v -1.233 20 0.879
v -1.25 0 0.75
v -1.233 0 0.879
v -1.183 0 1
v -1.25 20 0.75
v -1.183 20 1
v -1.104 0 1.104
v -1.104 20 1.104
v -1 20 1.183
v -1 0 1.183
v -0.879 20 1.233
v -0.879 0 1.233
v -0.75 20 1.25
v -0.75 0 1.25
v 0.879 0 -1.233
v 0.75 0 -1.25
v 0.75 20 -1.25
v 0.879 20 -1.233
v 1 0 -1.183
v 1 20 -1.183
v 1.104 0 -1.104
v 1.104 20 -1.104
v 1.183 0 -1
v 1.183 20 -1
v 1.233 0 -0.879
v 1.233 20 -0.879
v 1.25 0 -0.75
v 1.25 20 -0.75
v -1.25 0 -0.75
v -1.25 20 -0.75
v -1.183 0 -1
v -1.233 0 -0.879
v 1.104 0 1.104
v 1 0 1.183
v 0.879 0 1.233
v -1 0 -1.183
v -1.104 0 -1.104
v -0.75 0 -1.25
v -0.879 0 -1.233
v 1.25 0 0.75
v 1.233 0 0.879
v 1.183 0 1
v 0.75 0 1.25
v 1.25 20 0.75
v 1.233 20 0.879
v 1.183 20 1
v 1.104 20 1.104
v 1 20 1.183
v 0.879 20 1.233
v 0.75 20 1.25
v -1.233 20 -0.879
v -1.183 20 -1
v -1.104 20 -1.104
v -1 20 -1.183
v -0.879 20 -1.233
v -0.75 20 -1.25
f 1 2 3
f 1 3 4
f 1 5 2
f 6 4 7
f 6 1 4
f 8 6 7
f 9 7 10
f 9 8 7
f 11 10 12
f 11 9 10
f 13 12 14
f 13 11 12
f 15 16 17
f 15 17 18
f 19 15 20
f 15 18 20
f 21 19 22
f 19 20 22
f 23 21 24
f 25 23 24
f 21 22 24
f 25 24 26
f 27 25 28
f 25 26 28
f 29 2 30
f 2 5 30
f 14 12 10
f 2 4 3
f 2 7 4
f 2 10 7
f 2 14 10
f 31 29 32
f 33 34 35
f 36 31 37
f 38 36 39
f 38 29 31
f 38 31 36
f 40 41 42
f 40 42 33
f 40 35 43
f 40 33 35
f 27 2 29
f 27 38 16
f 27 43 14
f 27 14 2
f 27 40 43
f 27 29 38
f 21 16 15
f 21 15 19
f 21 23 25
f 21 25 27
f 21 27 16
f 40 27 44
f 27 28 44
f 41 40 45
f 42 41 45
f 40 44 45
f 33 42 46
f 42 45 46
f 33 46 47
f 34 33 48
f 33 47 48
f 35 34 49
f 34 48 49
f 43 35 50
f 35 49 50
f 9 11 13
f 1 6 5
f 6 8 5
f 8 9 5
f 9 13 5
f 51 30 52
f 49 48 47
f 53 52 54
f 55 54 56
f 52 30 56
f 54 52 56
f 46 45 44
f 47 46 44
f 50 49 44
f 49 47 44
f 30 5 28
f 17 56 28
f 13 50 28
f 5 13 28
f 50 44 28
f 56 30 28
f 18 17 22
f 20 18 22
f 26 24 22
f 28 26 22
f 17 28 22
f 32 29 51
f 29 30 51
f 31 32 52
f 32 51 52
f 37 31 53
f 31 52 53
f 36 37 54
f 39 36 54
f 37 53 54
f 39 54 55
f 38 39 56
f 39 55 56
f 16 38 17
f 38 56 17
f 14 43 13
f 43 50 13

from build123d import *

# Parameters (mm, degrees)
F0_W = 2.5
F0_H = 2.5
F3_R = 0.5


with BuildPart() as f2:
    # F2: sweep along a path in F1
    with BuildLine(Plane.XY) as f2_path:
        Line((0, 0), (0, 20))
    # F0 (on Front) → F2 (sweep)
    with BuildSketch(Plane.XZ):
        Rectangle(F0_W, F0_H)
    sweep(path=f2_path.line)

    # F3
    f3_edges = [f2.edges().sort_by_distance(p)[0] for p in [
        (-1.25, 10, -1.25),
        (-1.25, 10, 1.25),
        (1.25, 10, 1.25),
        (1.25, 10, -1.25),
    ]]
    fillet(f3_edges, radius=F3_R)


solid = f2.part
